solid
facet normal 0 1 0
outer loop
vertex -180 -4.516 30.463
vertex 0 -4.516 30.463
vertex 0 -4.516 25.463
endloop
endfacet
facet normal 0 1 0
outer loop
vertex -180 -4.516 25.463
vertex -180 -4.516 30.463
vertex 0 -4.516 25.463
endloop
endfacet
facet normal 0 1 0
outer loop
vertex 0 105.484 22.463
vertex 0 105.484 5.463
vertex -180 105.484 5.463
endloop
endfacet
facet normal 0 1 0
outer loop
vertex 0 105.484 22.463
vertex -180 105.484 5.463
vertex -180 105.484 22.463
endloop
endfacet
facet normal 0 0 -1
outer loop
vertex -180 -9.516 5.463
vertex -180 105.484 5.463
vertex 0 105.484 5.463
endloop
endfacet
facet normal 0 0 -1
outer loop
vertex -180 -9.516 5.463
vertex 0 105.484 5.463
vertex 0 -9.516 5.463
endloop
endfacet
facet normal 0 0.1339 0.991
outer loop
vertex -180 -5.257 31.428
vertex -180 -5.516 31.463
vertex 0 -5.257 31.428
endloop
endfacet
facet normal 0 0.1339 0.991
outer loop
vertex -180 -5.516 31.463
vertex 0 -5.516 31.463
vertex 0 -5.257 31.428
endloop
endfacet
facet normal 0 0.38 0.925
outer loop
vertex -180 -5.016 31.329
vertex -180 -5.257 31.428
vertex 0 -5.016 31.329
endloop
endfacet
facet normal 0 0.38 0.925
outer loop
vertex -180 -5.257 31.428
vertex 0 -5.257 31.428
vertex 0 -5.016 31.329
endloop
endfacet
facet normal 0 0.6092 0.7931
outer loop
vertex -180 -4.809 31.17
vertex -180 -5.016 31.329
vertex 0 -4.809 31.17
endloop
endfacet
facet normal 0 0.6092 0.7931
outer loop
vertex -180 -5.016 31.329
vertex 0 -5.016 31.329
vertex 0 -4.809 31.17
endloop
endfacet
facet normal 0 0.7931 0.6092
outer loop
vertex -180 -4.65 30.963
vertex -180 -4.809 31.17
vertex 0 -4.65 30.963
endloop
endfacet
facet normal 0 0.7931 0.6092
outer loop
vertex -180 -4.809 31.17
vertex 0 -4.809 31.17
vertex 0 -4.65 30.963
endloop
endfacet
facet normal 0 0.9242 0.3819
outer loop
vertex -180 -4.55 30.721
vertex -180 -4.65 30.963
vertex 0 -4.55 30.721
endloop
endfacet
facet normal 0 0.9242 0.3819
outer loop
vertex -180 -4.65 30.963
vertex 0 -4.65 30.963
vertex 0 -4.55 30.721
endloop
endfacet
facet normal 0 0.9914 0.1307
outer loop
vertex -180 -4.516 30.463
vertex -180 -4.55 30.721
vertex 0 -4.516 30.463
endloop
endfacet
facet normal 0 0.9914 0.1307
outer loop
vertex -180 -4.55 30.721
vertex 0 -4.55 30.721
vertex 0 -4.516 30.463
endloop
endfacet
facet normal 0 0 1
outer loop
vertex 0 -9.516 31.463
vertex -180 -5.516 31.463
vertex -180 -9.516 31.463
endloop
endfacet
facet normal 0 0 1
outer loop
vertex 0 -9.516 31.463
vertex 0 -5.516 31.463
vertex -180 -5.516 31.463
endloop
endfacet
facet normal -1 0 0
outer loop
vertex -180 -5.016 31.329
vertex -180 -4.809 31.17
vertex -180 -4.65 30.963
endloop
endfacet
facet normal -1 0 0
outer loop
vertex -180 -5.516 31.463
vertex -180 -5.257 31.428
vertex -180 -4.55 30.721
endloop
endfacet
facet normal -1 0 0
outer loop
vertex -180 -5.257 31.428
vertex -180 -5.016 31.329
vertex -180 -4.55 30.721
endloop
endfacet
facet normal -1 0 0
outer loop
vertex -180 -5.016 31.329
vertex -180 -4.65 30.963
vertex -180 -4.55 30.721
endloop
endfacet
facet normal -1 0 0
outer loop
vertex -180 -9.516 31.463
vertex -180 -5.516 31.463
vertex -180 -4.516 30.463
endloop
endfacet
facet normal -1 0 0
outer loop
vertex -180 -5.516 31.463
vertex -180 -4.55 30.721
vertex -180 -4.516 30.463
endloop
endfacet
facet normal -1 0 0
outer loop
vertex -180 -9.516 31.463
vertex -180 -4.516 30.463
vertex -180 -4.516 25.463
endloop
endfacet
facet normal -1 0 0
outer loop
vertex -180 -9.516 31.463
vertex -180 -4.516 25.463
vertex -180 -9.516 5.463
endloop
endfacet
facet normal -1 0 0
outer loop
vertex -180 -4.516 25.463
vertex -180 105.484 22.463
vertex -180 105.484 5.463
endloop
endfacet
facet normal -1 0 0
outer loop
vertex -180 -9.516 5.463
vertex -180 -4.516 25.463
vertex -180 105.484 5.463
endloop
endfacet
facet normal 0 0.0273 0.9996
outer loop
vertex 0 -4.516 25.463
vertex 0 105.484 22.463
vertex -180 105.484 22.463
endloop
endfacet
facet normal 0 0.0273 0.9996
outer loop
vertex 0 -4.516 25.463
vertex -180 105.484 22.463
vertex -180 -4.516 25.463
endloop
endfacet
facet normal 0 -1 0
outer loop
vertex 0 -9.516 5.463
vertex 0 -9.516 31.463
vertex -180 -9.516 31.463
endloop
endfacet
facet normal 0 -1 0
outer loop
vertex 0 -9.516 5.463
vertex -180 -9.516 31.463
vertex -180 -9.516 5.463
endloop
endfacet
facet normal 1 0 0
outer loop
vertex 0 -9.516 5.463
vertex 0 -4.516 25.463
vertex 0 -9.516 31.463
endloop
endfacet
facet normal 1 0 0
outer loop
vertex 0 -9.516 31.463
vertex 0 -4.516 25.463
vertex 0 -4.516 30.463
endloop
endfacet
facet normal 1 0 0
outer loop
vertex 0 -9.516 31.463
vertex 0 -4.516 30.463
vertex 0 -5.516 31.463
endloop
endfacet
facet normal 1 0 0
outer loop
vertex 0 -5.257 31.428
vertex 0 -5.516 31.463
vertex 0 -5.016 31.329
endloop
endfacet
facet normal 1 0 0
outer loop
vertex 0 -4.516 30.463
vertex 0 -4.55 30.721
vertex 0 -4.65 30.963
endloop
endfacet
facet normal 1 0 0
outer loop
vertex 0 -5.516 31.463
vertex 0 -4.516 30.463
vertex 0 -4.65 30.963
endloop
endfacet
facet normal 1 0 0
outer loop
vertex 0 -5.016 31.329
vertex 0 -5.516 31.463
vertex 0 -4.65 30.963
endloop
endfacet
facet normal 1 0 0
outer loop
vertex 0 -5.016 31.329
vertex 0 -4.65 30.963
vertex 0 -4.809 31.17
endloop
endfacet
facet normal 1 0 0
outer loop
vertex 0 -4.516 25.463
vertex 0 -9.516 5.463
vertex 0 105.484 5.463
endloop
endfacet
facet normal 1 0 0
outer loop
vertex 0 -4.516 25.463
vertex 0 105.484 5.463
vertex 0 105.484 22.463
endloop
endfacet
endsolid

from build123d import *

# Parameters (mm, degrees)
F1_DEPTH = 180
F2_W     = 60
F2_H     = 6
F2_H_2   = 20
F3_DEPTH = 5
F4_R     = 1
F5_DEPTH = 60
F6_DEPTH = 60


with BuildPart() as f1:
    # F0 (on Right) → F1 (new body)
    with BuildSketch(Plane.YZ):
        Polygon((105.484205862, 22.4625121504), (-4.515794138, 25.4625121504), (-4.515794138, 5.4625121504), (105.484205862, 5.4625121504), align=None)
    extrude(amount=-F1_DEPTH)

    # F2 (on face) → F3 (join)
    with BuildSketch(Plane.XZ.offset(4.515794138)):
        with Locations((-90, 28.4625121504)):
            Rectangle(F2_W, F2_H)
        with Locations((-90, 15.4625121504)):
            Rectangle(F2_W, F2_H_2)
    extrude(amount=F3_DEPTH)

    # F4
    f4_edges = [f1.edges().sort_by_distance(p)[0] for p in [
        (-90, -4.515794, 31.462512),
    ]]
    fillet(f4_edges, radius=F4_R)

    # F5 (add, through all): a face of the model
    f5_faces = [f1.faces().sort_by_distance(p)[0] for p in [
        (-60, -7.0195585786, 18.4413858238),
    ]]
    extrude(f5_faces, amount=F5_DEPTH)

    # F6 (add, through all): a face of the model
    f6_faces = [f1.faces().sort_by_distance(p)[0] for p in [
        (-120, -7.0195585786, 18.4413858238),
    ]]
    extrude(f6_faces, amount=F6_DEPTH)


solid = f1.part
